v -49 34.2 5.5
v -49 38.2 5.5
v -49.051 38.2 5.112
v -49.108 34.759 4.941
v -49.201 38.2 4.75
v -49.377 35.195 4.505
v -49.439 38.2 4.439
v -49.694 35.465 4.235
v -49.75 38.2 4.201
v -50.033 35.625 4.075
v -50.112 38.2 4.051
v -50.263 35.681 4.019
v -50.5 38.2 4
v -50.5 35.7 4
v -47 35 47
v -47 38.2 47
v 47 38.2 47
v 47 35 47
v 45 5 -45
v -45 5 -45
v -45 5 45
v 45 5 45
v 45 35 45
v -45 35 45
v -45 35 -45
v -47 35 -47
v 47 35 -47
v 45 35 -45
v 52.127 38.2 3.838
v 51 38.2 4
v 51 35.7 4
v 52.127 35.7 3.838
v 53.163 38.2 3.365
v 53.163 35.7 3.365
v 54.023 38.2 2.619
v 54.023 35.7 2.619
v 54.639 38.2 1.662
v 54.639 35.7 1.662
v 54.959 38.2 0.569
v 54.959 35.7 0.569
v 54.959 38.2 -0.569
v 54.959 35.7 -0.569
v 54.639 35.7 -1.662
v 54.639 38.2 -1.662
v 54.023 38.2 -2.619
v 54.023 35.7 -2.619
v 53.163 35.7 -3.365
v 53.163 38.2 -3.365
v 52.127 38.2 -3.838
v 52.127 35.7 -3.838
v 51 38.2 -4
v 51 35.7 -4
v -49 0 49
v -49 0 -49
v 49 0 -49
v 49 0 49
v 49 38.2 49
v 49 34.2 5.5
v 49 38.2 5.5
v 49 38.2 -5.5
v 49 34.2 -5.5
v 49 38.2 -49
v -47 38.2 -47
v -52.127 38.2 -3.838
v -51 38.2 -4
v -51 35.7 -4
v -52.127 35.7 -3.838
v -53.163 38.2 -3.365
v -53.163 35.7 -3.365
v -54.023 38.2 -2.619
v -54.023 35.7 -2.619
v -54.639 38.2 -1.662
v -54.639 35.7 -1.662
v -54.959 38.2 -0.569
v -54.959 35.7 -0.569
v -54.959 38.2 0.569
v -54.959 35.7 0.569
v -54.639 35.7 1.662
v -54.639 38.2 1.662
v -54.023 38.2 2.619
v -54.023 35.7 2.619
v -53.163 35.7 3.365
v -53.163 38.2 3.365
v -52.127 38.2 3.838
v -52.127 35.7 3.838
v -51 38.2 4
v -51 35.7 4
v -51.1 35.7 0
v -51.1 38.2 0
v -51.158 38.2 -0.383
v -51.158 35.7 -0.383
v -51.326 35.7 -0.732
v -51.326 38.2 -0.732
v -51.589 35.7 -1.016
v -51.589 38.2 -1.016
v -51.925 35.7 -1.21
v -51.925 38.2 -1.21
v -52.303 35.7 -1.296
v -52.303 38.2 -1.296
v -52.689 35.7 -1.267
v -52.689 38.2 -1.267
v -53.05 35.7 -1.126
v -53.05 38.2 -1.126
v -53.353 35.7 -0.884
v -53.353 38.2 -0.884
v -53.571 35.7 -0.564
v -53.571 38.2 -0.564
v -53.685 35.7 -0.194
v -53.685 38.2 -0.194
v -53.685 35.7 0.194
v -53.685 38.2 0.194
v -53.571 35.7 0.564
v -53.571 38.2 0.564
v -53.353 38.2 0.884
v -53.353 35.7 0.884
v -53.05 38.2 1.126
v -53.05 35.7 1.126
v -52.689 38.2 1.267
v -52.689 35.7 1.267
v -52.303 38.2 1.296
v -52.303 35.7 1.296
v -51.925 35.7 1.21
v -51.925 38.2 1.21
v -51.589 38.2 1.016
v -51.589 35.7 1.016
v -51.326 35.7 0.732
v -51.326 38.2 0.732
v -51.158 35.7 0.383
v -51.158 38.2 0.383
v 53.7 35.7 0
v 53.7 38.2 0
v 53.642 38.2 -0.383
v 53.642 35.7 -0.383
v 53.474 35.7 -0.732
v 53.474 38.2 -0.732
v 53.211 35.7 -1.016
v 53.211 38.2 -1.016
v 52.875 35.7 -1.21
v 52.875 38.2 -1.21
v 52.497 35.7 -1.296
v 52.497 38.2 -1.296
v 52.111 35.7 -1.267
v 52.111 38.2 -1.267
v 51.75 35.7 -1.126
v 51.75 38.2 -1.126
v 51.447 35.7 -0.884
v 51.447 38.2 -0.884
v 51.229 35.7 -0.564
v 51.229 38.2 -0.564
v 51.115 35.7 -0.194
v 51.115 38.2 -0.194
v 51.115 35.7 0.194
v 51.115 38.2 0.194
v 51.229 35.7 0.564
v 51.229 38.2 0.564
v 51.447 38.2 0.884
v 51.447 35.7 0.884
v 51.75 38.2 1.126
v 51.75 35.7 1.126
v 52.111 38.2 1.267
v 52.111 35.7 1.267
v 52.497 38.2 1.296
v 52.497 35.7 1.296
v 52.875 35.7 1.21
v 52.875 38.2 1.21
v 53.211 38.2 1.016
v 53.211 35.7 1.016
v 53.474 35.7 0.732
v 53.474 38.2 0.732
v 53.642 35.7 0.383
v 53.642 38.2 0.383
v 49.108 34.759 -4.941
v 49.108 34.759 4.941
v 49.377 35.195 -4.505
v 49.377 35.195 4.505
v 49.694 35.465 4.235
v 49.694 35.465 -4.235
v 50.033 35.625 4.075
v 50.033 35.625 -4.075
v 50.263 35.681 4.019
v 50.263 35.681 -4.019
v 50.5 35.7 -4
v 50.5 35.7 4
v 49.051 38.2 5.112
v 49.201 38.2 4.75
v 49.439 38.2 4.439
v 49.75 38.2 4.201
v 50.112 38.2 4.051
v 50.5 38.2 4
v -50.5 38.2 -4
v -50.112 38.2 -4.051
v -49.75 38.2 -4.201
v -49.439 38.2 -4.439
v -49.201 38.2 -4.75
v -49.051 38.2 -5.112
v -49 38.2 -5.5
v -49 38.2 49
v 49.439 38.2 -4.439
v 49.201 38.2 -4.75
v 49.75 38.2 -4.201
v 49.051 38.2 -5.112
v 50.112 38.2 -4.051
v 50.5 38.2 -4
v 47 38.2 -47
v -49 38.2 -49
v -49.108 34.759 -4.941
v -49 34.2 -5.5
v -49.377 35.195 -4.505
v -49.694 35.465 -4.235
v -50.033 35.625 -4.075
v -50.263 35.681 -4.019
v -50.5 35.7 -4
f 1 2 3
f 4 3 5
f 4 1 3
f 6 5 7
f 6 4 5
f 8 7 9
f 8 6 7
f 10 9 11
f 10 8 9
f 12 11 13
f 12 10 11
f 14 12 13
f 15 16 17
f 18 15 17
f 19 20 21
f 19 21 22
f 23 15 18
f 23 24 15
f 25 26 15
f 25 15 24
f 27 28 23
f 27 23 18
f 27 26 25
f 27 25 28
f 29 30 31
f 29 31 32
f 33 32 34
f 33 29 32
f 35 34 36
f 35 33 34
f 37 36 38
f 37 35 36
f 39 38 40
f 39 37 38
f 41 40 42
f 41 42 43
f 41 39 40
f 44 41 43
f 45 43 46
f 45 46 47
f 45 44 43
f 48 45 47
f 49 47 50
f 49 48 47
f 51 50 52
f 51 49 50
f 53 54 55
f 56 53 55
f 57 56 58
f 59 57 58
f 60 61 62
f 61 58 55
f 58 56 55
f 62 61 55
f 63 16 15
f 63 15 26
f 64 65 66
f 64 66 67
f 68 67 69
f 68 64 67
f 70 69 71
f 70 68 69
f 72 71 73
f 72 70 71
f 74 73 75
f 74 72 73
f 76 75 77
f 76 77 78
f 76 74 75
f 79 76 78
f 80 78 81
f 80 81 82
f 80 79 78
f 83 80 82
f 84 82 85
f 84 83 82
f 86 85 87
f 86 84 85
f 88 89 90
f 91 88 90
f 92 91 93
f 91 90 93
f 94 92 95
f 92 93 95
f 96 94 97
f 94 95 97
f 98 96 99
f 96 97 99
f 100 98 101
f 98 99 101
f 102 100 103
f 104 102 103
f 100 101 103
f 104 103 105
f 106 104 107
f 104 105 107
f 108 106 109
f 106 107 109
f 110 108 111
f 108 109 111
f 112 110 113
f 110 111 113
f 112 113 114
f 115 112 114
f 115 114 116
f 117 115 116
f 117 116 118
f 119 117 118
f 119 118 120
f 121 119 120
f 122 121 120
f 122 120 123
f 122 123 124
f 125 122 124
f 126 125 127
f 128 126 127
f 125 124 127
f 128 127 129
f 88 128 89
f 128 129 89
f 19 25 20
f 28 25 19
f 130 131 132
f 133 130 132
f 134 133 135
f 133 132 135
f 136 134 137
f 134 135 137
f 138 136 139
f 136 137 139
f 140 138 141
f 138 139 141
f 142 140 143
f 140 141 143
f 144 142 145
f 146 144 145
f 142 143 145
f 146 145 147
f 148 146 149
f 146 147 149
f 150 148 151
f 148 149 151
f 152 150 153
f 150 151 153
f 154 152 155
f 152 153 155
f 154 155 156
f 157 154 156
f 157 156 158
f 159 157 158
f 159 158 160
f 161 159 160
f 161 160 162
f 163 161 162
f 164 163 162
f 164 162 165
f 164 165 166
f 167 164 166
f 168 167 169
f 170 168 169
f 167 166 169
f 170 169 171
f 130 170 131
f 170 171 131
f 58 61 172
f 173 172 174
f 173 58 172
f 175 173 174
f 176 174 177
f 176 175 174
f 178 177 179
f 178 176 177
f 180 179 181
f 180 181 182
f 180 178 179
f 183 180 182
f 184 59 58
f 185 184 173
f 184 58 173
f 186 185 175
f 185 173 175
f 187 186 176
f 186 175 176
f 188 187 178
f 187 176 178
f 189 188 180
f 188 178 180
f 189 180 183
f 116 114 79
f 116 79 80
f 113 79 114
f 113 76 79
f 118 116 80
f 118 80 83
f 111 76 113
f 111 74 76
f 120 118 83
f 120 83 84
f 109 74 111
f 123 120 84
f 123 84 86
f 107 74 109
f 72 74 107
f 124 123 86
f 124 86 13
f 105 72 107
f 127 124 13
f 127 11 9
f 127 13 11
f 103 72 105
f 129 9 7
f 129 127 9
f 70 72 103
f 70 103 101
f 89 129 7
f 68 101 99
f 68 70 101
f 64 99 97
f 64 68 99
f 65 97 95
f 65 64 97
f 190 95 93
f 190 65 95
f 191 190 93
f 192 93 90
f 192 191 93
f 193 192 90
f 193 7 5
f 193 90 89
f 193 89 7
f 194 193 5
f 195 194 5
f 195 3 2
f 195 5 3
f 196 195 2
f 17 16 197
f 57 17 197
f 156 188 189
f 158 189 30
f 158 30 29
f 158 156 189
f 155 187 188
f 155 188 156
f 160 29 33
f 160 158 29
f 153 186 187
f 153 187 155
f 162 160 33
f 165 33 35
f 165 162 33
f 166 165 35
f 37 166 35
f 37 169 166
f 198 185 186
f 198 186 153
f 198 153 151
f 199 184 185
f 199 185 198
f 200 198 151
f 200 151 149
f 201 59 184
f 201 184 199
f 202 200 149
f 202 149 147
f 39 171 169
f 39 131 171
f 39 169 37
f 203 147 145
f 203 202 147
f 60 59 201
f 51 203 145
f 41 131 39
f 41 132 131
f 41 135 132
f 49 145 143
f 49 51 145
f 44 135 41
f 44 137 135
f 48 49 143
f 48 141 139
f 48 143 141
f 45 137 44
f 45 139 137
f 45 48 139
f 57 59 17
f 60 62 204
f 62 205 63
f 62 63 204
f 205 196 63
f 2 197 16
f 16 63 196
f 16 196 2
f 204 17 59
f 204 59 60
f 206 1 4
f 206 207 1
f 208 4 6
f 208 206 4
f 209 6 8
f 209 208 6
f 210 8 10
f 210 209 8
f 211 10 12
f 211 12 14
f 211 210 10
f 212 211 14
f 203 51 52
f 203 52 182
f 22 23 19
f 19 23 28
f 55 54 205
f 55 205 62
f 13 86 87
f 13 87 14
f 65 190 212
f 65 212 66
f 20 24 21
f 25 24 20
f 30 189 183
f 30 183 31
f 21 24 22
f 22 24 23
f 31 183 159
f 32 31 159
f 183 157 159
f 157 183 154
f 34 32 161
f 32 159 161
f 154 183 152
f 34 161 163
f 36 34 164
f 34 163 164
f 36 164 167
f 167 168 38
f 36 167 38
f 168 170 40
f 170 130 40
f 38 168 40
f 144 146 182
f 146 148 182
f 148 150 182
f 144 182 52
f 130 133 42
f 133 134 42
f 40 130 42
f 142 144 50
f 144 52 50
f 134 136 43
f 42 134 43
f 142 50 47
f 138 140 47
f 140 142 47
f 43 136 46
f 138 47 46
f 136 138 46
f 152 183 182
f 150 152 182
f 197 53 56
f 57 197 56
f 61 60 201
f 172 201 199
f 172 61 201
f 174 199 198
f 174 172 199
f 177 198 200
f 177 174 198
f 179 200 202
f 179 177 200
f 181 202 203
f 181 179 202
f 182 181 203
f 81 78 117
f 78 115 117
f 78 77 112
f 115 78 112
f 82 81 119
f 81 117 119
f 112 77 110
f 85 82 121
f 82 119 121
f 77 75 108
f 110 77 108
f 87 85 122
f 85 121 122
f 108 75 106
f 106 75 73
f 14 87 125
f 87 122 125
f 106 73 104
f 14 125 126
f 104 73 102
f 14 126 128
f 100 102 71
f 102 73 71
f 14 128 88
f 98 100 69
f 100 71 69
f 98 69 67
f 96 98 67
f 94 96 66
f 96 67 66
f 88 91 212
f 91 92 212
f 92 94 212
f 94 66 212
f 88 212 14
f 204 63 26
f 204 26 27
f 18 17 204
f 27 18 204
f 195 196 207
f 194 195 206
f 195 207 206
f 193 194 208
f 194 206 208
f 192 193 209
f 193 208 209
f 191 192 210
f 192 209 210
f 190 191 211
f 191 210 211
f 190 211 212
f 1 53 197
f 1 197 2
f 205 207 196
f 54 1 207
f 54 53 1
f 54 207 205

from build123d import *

# Parameters (mm, degrees)
SKETCH1_W           = 98
SKETCH1_H           = 98
BOSS_EXTRUDE1_DEPTH = 40
SKETCH2_W           = 94
SKETCH2_H           = 94
CUT_EXTRUDE1_DEPTH  = 5
SKETCH3_W           = 90
SKETCH3_H           = 90
CUT_EXTRUDE2_DEPTH  = 30
SKETCH4_W           = 98
SKETCH4_H           = 98
SKETCH4_W_2         = 94
SKETCH4_H_2         = 94
CUT_EXTRUDE3_DEPTH  = 1.8
SKETCH5_R           = 1.3
BOSS_EXTRUDE2_DEPTH = 2.5
FILLET1_R           = 1.5
FILLET2_R           = 1.5


with BuildPart() as part:
    # Sketch1 → Boss-Extrude1 (new body)
    with BuildSketch(Plane(origin=(0, 0, 0), x_dir=(1, 0, 0), z_dir=(0, 1, 0))):
        Rectangle(SKETCH1_W, SKETCH1_H)
    extrude(amount=BOSS_EXTRUDE1_DEPTH)

    # Sketch2 → Cut-Extrude1 (cut)
    with BuildSketch(Plane(origin=(0, 40, 0), x_dir=(1, 0, 0), z_dir=(0, 1, 0))):
        Rectangle(SKETCH2_W, SKETCH2_H)
    extrude(amount=-CUT_EXTRUDE1_DEPTH, mode=Mode.SUBTRACT)

    # Sketch3 → Cut-Extrude2 (cut)
    with BuildSketch(Plane(origin=(0, 35, 0), x_dir=(1, 0, 0), z_dir=(0, 1, 0))):
        Rectangle(SKETCH3_W, SKETCH3_H)
    extrude(amount=-CUT_EXTRUDE2_DEPTH, mode=Mode.SUBTRACT)

    # Sketch4 → Cut-Extrude3 (cut)
    with BuildSketch(Plane(origin=(0, 40, 0), x_dir=(1, 0, 0), z_dir=(0, 1, 0))):
        Rectangle(SKETCH4_W, SKETCH4_H)
        Rectangle(SKETCH4_W_2, SKETCH4_H_2, mode=Mode.SUBTRACT)
    extrude(amount=-CUT_EXTRUDE3_DEPTH, mode=Mode.SUBTRACT)

    # Sketch5 → Boss-Extrude2 (add)
    with BuildSketch(Plane(origin=(0, 38.2, 0), x_dir=(1, 0, 0), z_dir=(0, 1, 0))):
        with BuildLine():
            Line((-49, 4), (-51, 4))
            ThreePointArc((-51, 4), (-55, 0), (-51, -4))
            Line((-51, -4), (-49, -4))
            Line((-49, -4), (-49, 4))
        make_face()
        with Locations((-52.4, 0)):
            Circle(SKETCH5_R, mode=Mode.SUBTRACT)
        with BuildLine():
            Line((49, 4), (49, -4))
            Line((49, -4), (51, -4))
            ThreePointArc((51, -4), (55, 0), (51, 4))
            Line((51, 4), (49, 4))
        make_face()
        with Locations((52.4, 0)):
            Circle(SKETCH5_R, mode=Mode.SUBTRACT)
    extrude(amount=-BOSS_EXTRUDE2_DEPTH)

    # Fillet1
    fillet1_edges = [part.edges().sort_by_distance(p)[0] for p in [
        (-49, 35.7, 0),
        (-49, 36.95, -4),
        (-49, 36.95, 4),
    ]]
    fillet(fillet1_edges, radius=FILLET1_R)

    # Fillet2
    fillet2_edges = [part.edges().sort_by_distance(p)[0] for p in [
        (49, 36.95, -4),
        (49, 35.7, 0),
        (49, 36.95, 4),
    ]]
    fillet(fillet2_edges, radius=FILLET2_R)


solid = part.part
